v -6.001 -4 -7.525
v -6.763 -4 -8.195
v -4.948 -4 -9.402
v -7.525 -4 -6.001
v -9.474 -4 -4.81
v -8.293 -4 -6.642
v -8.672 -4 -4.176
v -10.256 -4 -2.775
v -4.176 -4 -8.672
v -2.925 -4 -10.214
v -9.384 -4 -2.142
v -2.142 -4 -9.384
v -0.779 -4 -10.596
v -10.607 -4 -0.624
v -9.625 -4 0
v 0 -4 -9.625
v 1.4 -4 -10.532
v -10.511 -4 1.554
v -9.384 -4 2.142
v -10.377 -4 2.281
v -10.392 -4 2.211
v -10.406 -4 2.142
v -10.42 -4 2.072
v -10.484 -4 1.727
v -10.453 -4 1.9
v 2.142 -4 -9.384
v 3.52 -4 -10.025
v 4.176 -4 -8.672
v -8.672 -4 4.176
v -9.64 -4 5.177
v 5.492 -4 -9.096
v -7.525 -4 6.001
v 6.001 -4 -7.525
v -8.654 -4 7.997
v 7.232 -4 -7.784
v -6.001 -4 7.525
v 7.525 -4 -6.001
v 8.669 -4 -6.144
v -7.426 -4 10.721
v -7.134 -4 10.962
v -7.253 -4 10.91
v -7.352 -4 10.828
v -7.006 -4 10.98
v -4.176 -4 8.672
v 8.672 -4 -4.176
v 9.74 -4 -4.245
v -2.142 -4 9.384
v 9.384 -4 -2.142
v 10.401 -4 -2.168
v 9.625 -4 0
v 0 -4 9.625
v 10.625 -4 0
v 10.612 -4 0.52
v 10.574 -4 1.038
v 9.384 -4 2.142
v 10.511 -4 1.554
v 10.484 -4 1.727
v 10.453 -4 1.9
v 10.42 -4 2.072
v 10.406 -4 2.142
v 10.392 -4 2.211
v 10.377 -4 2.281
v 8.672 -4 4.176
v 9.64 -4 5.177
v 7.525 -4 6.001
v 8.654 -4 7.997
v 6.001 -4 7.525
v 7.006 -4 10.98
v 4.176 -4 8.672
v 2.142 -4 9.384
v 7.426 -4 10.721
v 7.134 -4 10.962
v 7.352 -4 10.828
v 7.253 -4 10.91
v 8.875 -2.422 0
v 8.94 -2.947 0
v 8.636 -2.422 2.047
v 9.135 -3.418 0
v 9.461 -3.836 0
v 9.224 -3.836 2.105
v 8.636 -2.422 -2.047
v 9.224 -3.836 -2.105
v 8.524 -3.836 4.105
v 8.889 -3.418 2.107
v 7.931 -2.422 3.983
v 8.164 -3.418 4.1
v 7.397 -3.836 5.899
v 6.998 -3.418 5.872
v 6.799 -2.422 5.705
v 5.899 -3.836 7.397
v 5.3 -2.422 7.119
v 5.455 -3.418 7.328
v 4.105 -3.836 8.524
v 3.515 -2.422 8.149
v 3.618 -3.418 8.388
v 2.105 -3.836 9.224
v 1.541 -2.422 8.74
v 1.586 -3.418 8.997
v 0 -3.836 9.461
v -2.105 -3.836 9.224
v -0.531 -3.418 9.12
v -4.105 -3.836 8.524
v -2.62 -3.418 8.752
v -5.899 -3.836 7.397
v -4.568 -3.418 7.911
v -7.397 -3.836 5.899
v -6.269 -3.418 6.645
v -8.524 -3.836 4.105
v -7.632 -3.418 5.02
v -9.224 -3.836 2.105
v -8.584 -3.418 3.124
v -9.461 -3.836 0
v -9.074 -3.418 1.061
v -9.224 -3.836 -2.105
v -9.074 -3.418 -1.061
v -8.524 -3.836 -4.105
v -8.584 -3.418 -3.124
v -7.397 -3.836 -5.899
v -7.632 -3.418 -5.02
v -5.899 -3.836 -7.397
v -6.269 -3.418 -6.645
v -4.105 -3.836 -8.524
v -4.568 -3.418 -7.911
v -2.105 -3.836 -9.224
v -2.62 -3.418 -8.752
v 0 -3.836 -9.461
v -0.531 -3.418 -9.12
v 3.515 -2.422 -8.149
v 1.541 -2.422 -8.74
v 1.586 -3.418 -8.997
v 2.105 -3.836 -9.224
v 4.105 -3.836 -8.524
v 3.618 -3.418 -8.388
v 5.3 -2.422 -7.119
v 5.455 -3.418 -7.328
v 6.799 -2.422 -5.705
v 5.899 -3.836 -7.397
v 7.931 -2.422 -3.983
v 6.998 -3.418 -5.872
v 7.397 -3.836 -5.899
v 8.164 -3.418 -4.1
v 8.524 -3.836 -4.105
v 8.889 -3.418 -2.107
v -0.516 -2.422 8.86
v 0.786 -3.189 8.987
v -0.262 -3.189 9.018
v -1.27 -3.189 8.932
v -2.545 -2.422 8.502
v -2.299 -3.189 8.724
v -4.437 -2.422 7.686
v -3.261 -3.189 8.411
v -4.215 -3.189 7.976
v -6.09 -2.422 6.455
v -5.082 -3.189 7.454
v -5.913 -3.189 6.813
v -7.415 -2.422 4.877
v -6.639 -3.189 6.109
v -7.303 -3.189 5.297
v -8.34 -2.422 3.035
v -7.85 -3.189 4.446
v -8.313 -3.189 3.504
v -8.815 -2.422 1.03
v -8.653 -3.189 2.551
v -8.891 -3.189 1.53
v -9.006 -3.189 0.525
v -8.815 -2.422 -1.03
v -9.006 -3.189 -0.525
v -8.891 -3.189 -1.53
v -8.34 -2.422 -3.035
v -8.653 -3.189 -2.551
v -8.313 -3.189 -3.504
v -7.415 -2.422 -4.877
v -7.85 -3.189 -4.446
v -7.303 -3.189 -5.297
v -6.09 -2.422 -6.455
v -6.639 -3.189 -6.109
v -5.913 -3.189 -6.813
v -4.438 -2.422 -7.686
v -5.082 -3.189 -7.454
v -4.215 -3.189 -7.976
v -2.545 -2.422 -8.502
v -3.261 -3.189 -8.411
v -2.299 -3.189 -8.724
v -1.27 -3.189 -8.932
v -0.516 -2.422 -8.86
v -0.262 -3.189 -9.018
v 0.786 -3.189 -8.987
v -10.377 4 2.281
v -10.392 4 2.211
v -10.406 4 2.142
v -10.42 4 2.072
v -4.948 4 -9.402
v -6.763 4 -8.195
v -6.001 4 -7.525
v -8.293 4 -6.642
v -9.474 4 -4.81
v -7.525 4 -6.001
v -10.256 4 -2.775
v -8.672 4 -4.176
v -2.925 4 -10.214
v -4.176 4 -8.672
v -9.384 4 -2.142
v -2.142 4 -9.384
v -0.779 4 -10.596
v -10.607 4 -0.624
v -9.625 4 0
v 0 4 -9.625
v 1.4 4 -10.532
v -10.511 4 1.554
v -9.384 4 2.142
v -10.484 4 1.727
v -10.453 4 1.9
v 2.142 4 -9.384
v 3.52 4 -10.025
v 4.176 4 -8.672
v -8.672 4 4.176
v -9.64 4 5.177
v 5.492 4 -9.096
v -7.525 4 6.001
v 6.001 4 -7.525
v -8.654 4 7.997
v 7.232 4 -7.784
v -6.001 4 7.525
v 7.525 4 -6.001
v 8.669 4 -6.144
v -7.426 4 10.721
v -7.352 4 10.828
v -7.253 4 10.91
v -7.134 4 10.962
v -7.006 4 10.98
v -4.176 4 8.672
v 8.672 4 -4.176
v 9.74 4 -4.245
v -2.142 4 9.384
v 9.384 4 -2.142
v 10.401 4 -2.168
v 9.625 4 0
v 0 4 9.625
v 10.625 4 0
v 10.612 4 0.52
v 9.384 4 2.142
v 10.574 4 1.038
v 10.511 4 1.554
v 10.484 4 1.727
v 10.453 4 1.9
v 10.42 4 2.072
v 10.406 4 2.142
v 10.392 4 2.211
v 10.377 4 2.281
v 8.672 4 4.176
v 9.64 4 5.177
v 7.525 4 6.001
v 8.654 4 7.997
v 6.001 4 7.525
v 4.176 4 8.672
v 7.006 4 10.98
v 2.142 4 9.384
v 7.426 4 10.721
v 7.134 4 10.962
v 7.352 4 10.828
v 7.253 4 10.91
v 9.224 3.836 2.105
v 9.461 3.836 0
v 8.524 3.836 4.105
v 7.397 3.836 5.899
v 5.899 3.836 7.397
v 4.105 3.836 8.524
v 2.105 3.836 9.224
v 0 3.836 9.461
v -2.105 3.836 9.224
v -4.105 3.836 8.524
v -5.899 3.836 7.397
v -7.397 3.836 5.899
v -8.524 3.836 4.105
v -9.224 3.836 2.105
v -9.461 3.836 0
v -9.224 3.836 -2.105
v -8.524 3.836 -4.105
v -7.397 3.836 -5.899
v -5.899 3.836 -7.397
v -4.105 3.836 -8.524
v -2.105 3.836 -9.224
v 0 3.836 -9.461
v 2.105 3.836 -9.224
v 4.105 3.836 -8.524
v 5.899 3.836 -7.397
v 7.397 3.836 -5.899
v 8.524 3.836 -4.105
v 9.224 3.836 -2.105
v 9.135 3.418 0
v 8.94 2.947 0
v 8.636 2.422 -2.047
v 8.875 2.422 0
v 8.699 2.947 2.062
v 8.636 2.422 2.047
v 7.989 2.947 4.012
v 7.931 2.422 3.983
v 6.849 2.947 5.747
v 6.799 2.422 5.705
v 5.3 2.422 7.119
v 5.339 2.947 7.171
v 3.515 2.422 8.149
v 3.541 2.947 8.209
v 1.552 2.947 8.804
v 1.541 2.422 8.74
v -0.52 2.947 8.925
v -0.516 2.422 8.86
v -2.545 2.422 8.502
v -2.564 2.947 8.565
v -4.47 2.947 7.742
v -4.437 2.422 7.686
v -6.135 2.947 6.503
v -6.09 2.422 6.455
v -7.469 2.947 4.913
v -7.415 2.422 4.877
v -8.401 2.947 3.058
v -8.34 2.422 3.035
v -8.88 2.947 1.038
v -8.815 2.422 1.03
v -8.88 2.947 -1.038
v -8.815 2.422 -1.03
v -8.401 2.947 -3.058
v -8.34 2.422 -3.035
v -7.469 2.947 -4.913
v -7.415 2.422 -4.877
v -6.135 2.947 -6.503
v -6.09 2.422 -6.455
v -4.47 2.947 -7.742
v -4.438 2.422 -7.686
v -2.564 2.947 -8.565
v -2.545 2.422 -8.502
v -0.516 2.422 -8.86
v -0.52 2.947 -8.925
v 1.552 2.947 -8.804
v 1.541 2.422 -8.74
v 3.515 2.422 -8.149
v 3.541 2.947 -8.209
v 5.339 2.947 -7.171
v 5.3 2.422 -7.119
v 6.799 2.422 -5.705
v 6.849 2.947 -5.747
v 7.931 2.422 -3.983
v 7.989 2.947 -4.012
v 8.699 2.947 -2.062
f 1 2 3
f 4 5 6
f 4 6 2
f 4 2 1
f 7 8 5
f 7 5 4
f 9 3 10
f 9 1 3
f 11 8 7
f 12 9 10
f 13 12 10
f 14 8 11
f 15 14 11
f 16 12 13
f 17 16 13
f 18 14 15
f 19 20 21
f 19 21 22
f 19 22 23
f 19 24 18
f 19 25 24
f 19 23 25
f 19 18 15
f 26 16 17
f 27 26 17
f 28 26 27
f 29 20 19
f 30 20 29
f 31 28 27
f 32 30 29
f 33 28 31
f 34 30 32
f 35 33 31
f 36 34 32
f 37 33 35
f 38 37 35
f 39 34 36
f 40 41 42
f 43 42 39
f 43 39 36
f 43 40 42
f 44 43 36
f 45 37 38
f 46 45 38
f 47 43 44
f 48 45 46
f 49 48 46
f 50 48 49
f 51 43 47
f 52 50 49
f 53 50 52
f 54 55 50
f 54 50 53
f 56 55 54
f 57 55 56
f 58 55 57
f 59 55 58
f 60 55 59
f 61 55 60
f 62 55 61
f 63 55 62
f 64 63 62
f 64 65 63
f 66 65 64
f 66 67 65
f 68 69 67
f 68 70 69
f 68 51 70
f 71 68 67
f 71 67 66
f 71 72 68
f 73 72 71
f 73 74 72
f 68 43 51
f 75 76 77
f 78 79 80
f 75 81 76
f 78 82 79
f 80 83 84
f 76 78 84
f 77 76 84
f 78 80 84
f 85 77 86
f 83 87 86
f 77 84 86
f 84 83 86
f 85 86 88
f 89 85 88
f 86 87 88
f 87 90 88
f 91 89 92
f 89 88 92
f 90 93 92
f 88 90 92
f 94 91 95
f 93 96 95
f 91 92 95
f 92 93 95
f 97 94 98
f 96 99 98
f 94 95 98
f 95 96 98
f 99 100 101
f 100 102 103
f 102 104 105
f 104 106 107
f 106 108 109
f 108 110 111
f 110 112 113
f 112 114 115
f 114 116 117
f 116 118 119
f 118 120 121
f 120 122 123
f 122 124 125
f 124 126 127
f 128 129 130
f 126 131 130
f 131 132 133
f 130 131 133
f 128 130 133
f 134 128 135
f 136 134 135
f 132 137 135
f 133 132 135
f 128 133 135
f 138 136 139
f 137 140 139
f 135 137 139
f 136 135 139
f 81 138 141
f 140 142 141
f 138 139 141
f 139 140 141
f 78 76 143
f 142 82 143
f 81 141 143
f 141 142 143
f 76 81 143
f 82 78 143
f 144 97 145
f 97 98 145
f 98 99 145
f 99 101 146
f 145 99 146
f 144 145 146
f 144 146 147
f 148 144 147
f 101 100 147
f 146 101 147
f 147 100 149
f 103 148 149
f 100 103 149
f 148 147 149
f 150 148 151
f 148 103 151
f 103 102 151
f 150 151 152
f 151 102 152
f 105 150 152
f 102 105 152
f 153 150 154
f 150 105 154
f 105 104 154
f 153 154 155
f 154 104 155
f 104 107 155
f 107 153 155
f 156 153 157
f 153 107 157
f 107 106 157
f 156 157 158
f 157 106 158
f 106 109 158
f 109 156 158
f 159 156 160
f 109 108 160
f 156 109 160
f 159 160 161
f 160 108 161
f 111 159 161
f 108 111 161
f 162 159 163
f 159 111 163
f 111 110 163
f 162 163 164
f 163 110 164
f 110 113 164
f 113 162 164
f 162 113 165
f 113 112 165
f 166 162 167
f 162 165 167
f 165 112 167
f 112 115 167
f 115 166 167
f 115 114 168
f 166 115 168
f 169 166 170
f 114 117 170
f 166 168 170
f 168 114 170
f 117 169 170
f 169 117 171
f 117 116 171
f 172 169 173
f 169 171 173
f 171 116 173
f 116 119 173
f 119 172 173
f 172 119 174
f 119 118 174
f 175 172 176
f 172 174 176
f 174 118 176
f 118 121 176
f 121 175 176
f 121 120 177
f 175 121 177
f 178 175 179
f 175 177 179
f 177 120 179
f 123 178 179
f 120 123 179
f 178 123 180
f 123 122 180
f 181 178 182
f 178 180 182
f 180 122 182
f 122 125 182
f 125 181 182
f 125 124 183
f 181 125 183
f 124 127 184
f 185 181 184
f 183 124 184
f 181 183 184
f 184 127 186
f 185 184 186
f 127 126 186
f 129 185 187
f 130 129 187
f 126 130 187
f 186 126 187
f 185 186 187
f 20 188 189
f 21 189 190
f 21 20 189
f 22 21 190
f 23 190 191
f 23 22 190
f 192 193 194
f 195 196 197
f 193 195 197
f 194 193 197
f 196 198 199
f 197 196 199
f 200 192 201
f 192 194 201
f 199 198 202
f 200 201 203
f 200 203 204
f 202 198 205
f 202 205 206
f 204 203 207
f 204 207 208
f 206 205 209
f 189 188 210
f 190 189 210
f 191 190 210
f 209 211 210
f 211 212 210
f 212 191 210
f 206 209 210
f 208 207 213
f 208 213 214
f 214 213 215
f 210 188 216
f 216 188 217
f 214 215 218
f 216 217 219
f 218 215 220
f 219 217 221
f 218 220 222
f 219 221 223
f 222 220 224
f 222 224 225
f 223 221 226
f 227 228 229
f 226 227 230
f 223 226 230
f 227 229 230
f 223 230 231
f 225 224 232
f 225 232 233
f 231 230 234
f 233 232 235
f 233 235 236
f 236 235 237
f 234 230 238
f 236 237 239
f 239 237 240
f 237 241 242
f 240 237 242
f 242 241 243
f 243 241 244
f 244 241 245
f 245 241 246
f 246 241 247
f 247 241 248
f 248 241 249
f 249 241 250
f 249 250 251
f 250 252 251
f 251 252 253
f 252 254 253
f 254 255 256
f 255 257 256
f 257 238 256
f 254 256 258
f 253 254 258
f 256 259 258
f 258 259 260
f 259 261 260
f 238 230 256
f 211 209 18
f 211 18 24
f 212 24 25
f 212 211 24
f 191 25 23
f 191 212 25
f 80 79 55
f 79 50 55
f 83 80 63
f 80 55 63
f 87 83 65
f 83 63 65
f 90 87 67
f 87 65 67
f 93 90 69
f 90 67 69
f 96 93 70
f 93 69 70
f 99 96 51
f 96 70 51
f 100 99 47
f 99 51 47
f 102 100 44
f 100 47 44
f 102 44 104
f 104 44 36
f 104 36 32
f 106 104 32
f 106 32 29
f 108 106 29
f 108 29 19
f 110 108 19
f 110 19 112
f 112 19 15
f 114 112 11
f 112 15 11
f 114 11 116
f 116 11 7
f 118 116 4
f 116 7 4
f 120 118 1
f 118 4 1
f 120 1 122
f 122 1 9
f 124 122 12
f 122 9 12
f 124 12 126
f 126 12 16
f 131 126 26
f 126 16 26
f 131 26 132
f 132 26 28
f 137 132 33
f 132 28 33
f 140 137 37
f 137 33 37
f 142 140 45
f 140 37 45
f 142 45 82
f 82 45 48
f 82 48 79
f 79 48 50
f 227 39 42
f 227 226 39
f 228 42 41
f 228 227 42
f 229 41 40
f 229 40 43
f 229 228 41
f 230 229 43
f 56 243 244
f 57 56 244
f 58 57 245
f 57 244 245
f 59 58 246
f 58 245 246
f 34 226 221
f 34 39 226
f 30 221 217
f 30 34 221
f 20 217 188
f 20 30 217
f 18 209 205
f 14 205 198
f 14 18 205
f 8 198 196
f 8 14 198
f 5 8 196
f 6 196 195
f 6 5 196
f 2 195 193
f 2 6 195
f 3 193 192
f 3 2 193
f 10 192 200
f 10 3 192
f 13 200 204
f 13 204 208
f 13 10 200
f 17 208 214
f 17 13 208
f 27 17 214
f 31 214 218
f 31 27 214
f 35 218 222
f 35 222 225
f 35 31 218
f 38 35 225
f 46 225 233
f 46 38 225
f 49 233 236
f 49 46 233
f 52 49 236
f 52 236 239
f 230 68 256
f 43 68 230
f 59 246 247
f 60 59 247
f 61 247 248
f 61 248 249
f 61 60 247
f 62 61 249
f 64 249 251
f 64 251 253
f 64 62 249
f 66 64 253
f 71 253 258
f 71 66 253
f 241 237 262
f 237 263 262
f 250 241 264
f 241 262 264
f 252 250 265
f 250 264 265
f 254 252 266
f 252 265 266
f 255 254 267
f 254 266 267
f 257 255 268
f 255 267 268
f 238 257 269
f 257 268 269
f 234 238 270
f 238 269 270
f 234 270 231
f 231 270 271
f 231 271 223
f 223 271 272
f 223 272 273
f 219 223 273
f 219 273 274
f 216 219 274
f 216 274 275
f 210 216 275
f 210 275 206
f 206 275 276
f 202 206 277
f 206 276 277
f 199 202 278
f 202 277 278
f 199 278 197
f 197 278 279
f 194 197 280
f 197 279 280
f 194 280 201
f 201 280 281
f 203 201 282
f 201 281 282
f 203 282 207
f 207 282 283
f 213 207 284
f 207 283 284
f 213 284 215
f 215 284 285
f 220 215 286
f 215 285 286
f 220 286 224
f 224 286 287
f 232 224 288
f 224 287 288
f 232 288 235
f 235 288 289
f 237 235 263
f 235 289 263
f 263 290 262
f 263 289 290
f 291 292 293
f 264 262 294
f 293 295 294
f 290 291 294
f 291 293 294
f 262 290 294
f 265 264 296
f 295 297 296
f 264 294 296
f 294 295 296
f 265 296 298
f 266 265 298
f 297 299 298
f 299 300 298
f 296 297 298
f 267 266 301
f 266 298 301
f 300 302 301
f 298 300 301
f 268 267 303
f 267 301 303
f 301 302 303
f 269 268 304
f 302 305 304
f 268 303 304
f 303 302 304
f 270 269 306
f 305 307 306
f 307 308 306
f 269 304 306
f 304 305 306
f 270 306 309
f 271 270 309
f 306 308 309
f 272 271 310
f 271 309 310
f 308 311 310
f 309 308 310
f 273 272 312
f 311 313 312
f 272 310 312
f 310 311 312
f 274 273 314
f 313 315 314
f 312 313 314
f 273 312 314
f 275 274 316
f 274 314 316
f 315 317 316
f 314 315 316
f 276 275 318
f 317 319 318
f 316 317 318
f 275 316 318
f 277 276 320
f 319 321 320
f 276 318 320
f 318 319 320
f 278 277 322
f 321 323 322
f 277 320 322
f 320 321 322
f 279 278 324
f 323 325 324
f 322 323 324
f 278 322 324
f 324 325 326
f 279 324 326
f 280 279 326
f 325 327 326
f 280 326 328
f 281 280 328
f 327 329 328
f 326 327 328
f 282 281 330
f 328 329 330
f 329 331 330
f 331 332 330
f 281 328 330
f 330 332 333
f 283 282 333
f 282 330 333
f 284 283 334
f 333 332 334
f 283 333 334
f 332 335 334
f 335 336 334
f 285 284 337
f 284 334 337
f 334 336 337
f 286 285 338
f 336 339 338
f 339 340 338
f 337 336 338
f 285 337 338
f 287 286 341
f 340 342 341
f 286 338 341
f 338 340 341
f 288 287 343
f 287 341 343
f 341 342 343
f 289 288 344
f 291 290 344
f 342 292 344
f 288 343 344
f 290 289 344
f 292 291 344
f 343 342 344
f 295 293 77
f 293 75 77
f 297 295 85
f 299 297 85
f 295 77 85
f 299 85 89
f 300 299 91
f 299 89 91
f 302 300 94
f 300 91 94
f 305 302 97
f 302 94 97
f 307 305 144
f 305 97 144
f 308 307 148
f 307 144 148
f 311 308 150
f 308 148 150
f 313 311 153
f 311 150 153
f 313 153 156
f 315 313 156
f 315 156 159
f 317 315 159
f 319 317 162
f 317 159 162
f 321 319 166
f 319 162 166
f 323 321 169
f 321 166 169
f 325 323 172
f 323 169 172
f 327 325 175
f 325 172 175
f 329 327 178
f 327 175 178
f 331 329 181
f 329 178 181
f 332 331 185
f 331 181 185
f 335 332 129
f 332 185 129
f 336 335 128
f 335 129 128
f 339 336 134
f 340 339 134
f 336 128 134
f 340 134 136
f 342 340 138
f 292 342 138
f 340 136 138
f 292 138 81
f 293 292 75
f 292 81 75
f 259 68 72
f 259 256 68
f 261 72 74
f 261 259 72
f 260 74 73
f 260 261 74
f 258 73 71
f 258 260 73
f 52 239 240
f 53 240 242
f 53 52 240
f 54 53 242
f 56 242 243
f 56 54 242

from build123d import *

# Parameters (mm, degrees)
F0_R          = 8.875
F1_DEPTH      = 4
F1_DEPTH_BACK = 4
F2_T1_DEPTH   = 10.0420034221
F3_SIZE       = 0.75
F4_R          = 0.4704417071


# Not quite as in the source:
# - a fillet or chamfer that OpenCascade refuses, or shapes differently, is made with other operations: its cross-section is extruded or revolved along the edge and cut away or added


with BuildPart() as f1:
    # F0 (on Front) → F1 (new body, two sides)
    with BuildSketch(Plane.XZ) as f1_sk:
        with BuildLine():
            ThreePointArc((-10.4432812291, 1.9566558639), (-0.9825380249, -10.5794727671), (10.625, 0))
            ThreePointArc((10.625, 0), (10.5794727671, 0.9825380249), (10.4432812291, 1.9566558639))
            ThreePointArc((10.4432812291, 1.9566558639), (10.4107043639, 2.1187258688), (10.3773464915, 2.2806369277))
            ThreePointArc((10.3773464915, 2.2806369277), (0, 10.625), (-10.3773464915, 2.2806369277))
            ThreePointArc((-10.3773464915, 2.2806369277), (-10.4107043639, 2.1187258688), (-10.4432812291, 1.9566558639))
        make_face()
        Circle(F0_R, mode=Mode.SUBTRACT)
        with BuildLine():
            ThreePointArc((-10.3773464915, 2.2806369277), (0, 10.625), (10.3773464915, 2.2806369277))
            ThreePointArc((10.3773464915, 2.2806369277), (9.1298481014, 6.734538497), (7.2942513551, 10.9800156206))
            Line((7.2942513551, 10.9800156206), (0, 10.9800156206))
            Line((0, 10.9800156206), (-7.2942513551, 10.9800156206))
            ThreePointArc((-7.2942513551, 10.9800156206), (-9.1298481014, 6.734538497), (-10.3773464915, 2.2806369277))
        make_face()
    extrude(amount=F1_DEPTH)
    extrude(f1_sk.sketch, amount=-F1_DEPTH_BACK)

    # F2: fillet of radius 10 on 2 edges, made by hand

    # F2_s2 → F2_t1 (cut)
    with BuildSketch(Plane.XZ.offset(-5.021001711)):
        with BuildLine():
            ThreePointArc((-10.5107619586, 1.5538687363), (-10.4688734573, 1.813557001), (-10.4201690702, 2.0720536626))
            ThreePointArc((-10.4201690702, 2.0720536626), (-10.4317746612, 2.0143646795), (-10.4432812291, 1.9566558639))
            ThreePointArc((-10.4432812291, 1.9566558639), (-10.4789570495, 1.7555865557), (-10.5107619586, 1.5538687363))
        make_face()
        with BuildLine():
            ThreePointArc((10.5107619586, 1.5538687363), (10.4688734573, 1.813557001), (10.4201690702, 2.0720536626))
            ThreePointArc((10.4201690702, 2.0720536626), (10.4317746612, 2.0143646795), (10.4432812291, 1.9566558639))
            ThreePointArc((10.4432812291, 1.9566558639), (10.4789570495, 1.7555865557), (10.5107619586, 1.5538687363))
        make_face()
    extrude(amount=F2_T1_DEPTH, mode=Mode.SUBTRACT)

    # F3
    f3_edges = [f1.edges().sort_by_distance(p)[0] for p in [
        (-8.875, 4, 0),
        (-8.875, -4, 0),
    ]]
    chamfer(f3_edges, length=F3_SIZE)

    # F4
    f4_edges = [f1.edges().sort_by_distance(p)[0] for p in [
        (-7.294251, 0, 10.980016),
        (7.294251, 0, 10.980016),
    ]]
    fillet(f4_edges, radius=F4_R)

    # F5: fillet of radius 2 on 2 edges, made by hand

    # F5_s1 → F5_t2 (revolve, cut)
    with BuildSketch(Plane.XY):
        with BuildLine():
            add(Edge.make_bspline(
                [(8.875, -2.4215728753), (8.875, -3.25), (9.4607864376, -3.8357864376)],
                knots=[0, 0, 0, 1, 1, 1], degree=2, weights=[1, 1, 1]))
            Line((9.4607864376, -3.8357864376), (8.875, -3.25))
            Line((8.875, -3.25), (8.875, -2.4215728753))
        make_face()
    revolve(axis=Axis((0, -3.25, 0), (0, -1, 0)), mode=Mode.SUBTRACT)

    # F5_s3 → F5_t4 (revolve, cut)
    with BuildSketch(Plane.XY):
        with BuildLine():
            add(Edge.make_bspline(
                [(9.4607864376, 3.8357864376), (8.875, 3.25), (8.875, 2.4215728753)],
                knots=[0, 0, 0, 1, 1, 1], degree=2, weights=[1, 1, 1]))
            Line((8.875, 2.4215728753), (8.875, 3.25))
            Line((8.875, 3.25), (9.4607864376, 3.8357864376))
        make_face()
    revolve(axis=Axis((0, 3.25, 0), (0, -1, 0)), mode=Mode.SUBTRACT)


solid = f1.part
